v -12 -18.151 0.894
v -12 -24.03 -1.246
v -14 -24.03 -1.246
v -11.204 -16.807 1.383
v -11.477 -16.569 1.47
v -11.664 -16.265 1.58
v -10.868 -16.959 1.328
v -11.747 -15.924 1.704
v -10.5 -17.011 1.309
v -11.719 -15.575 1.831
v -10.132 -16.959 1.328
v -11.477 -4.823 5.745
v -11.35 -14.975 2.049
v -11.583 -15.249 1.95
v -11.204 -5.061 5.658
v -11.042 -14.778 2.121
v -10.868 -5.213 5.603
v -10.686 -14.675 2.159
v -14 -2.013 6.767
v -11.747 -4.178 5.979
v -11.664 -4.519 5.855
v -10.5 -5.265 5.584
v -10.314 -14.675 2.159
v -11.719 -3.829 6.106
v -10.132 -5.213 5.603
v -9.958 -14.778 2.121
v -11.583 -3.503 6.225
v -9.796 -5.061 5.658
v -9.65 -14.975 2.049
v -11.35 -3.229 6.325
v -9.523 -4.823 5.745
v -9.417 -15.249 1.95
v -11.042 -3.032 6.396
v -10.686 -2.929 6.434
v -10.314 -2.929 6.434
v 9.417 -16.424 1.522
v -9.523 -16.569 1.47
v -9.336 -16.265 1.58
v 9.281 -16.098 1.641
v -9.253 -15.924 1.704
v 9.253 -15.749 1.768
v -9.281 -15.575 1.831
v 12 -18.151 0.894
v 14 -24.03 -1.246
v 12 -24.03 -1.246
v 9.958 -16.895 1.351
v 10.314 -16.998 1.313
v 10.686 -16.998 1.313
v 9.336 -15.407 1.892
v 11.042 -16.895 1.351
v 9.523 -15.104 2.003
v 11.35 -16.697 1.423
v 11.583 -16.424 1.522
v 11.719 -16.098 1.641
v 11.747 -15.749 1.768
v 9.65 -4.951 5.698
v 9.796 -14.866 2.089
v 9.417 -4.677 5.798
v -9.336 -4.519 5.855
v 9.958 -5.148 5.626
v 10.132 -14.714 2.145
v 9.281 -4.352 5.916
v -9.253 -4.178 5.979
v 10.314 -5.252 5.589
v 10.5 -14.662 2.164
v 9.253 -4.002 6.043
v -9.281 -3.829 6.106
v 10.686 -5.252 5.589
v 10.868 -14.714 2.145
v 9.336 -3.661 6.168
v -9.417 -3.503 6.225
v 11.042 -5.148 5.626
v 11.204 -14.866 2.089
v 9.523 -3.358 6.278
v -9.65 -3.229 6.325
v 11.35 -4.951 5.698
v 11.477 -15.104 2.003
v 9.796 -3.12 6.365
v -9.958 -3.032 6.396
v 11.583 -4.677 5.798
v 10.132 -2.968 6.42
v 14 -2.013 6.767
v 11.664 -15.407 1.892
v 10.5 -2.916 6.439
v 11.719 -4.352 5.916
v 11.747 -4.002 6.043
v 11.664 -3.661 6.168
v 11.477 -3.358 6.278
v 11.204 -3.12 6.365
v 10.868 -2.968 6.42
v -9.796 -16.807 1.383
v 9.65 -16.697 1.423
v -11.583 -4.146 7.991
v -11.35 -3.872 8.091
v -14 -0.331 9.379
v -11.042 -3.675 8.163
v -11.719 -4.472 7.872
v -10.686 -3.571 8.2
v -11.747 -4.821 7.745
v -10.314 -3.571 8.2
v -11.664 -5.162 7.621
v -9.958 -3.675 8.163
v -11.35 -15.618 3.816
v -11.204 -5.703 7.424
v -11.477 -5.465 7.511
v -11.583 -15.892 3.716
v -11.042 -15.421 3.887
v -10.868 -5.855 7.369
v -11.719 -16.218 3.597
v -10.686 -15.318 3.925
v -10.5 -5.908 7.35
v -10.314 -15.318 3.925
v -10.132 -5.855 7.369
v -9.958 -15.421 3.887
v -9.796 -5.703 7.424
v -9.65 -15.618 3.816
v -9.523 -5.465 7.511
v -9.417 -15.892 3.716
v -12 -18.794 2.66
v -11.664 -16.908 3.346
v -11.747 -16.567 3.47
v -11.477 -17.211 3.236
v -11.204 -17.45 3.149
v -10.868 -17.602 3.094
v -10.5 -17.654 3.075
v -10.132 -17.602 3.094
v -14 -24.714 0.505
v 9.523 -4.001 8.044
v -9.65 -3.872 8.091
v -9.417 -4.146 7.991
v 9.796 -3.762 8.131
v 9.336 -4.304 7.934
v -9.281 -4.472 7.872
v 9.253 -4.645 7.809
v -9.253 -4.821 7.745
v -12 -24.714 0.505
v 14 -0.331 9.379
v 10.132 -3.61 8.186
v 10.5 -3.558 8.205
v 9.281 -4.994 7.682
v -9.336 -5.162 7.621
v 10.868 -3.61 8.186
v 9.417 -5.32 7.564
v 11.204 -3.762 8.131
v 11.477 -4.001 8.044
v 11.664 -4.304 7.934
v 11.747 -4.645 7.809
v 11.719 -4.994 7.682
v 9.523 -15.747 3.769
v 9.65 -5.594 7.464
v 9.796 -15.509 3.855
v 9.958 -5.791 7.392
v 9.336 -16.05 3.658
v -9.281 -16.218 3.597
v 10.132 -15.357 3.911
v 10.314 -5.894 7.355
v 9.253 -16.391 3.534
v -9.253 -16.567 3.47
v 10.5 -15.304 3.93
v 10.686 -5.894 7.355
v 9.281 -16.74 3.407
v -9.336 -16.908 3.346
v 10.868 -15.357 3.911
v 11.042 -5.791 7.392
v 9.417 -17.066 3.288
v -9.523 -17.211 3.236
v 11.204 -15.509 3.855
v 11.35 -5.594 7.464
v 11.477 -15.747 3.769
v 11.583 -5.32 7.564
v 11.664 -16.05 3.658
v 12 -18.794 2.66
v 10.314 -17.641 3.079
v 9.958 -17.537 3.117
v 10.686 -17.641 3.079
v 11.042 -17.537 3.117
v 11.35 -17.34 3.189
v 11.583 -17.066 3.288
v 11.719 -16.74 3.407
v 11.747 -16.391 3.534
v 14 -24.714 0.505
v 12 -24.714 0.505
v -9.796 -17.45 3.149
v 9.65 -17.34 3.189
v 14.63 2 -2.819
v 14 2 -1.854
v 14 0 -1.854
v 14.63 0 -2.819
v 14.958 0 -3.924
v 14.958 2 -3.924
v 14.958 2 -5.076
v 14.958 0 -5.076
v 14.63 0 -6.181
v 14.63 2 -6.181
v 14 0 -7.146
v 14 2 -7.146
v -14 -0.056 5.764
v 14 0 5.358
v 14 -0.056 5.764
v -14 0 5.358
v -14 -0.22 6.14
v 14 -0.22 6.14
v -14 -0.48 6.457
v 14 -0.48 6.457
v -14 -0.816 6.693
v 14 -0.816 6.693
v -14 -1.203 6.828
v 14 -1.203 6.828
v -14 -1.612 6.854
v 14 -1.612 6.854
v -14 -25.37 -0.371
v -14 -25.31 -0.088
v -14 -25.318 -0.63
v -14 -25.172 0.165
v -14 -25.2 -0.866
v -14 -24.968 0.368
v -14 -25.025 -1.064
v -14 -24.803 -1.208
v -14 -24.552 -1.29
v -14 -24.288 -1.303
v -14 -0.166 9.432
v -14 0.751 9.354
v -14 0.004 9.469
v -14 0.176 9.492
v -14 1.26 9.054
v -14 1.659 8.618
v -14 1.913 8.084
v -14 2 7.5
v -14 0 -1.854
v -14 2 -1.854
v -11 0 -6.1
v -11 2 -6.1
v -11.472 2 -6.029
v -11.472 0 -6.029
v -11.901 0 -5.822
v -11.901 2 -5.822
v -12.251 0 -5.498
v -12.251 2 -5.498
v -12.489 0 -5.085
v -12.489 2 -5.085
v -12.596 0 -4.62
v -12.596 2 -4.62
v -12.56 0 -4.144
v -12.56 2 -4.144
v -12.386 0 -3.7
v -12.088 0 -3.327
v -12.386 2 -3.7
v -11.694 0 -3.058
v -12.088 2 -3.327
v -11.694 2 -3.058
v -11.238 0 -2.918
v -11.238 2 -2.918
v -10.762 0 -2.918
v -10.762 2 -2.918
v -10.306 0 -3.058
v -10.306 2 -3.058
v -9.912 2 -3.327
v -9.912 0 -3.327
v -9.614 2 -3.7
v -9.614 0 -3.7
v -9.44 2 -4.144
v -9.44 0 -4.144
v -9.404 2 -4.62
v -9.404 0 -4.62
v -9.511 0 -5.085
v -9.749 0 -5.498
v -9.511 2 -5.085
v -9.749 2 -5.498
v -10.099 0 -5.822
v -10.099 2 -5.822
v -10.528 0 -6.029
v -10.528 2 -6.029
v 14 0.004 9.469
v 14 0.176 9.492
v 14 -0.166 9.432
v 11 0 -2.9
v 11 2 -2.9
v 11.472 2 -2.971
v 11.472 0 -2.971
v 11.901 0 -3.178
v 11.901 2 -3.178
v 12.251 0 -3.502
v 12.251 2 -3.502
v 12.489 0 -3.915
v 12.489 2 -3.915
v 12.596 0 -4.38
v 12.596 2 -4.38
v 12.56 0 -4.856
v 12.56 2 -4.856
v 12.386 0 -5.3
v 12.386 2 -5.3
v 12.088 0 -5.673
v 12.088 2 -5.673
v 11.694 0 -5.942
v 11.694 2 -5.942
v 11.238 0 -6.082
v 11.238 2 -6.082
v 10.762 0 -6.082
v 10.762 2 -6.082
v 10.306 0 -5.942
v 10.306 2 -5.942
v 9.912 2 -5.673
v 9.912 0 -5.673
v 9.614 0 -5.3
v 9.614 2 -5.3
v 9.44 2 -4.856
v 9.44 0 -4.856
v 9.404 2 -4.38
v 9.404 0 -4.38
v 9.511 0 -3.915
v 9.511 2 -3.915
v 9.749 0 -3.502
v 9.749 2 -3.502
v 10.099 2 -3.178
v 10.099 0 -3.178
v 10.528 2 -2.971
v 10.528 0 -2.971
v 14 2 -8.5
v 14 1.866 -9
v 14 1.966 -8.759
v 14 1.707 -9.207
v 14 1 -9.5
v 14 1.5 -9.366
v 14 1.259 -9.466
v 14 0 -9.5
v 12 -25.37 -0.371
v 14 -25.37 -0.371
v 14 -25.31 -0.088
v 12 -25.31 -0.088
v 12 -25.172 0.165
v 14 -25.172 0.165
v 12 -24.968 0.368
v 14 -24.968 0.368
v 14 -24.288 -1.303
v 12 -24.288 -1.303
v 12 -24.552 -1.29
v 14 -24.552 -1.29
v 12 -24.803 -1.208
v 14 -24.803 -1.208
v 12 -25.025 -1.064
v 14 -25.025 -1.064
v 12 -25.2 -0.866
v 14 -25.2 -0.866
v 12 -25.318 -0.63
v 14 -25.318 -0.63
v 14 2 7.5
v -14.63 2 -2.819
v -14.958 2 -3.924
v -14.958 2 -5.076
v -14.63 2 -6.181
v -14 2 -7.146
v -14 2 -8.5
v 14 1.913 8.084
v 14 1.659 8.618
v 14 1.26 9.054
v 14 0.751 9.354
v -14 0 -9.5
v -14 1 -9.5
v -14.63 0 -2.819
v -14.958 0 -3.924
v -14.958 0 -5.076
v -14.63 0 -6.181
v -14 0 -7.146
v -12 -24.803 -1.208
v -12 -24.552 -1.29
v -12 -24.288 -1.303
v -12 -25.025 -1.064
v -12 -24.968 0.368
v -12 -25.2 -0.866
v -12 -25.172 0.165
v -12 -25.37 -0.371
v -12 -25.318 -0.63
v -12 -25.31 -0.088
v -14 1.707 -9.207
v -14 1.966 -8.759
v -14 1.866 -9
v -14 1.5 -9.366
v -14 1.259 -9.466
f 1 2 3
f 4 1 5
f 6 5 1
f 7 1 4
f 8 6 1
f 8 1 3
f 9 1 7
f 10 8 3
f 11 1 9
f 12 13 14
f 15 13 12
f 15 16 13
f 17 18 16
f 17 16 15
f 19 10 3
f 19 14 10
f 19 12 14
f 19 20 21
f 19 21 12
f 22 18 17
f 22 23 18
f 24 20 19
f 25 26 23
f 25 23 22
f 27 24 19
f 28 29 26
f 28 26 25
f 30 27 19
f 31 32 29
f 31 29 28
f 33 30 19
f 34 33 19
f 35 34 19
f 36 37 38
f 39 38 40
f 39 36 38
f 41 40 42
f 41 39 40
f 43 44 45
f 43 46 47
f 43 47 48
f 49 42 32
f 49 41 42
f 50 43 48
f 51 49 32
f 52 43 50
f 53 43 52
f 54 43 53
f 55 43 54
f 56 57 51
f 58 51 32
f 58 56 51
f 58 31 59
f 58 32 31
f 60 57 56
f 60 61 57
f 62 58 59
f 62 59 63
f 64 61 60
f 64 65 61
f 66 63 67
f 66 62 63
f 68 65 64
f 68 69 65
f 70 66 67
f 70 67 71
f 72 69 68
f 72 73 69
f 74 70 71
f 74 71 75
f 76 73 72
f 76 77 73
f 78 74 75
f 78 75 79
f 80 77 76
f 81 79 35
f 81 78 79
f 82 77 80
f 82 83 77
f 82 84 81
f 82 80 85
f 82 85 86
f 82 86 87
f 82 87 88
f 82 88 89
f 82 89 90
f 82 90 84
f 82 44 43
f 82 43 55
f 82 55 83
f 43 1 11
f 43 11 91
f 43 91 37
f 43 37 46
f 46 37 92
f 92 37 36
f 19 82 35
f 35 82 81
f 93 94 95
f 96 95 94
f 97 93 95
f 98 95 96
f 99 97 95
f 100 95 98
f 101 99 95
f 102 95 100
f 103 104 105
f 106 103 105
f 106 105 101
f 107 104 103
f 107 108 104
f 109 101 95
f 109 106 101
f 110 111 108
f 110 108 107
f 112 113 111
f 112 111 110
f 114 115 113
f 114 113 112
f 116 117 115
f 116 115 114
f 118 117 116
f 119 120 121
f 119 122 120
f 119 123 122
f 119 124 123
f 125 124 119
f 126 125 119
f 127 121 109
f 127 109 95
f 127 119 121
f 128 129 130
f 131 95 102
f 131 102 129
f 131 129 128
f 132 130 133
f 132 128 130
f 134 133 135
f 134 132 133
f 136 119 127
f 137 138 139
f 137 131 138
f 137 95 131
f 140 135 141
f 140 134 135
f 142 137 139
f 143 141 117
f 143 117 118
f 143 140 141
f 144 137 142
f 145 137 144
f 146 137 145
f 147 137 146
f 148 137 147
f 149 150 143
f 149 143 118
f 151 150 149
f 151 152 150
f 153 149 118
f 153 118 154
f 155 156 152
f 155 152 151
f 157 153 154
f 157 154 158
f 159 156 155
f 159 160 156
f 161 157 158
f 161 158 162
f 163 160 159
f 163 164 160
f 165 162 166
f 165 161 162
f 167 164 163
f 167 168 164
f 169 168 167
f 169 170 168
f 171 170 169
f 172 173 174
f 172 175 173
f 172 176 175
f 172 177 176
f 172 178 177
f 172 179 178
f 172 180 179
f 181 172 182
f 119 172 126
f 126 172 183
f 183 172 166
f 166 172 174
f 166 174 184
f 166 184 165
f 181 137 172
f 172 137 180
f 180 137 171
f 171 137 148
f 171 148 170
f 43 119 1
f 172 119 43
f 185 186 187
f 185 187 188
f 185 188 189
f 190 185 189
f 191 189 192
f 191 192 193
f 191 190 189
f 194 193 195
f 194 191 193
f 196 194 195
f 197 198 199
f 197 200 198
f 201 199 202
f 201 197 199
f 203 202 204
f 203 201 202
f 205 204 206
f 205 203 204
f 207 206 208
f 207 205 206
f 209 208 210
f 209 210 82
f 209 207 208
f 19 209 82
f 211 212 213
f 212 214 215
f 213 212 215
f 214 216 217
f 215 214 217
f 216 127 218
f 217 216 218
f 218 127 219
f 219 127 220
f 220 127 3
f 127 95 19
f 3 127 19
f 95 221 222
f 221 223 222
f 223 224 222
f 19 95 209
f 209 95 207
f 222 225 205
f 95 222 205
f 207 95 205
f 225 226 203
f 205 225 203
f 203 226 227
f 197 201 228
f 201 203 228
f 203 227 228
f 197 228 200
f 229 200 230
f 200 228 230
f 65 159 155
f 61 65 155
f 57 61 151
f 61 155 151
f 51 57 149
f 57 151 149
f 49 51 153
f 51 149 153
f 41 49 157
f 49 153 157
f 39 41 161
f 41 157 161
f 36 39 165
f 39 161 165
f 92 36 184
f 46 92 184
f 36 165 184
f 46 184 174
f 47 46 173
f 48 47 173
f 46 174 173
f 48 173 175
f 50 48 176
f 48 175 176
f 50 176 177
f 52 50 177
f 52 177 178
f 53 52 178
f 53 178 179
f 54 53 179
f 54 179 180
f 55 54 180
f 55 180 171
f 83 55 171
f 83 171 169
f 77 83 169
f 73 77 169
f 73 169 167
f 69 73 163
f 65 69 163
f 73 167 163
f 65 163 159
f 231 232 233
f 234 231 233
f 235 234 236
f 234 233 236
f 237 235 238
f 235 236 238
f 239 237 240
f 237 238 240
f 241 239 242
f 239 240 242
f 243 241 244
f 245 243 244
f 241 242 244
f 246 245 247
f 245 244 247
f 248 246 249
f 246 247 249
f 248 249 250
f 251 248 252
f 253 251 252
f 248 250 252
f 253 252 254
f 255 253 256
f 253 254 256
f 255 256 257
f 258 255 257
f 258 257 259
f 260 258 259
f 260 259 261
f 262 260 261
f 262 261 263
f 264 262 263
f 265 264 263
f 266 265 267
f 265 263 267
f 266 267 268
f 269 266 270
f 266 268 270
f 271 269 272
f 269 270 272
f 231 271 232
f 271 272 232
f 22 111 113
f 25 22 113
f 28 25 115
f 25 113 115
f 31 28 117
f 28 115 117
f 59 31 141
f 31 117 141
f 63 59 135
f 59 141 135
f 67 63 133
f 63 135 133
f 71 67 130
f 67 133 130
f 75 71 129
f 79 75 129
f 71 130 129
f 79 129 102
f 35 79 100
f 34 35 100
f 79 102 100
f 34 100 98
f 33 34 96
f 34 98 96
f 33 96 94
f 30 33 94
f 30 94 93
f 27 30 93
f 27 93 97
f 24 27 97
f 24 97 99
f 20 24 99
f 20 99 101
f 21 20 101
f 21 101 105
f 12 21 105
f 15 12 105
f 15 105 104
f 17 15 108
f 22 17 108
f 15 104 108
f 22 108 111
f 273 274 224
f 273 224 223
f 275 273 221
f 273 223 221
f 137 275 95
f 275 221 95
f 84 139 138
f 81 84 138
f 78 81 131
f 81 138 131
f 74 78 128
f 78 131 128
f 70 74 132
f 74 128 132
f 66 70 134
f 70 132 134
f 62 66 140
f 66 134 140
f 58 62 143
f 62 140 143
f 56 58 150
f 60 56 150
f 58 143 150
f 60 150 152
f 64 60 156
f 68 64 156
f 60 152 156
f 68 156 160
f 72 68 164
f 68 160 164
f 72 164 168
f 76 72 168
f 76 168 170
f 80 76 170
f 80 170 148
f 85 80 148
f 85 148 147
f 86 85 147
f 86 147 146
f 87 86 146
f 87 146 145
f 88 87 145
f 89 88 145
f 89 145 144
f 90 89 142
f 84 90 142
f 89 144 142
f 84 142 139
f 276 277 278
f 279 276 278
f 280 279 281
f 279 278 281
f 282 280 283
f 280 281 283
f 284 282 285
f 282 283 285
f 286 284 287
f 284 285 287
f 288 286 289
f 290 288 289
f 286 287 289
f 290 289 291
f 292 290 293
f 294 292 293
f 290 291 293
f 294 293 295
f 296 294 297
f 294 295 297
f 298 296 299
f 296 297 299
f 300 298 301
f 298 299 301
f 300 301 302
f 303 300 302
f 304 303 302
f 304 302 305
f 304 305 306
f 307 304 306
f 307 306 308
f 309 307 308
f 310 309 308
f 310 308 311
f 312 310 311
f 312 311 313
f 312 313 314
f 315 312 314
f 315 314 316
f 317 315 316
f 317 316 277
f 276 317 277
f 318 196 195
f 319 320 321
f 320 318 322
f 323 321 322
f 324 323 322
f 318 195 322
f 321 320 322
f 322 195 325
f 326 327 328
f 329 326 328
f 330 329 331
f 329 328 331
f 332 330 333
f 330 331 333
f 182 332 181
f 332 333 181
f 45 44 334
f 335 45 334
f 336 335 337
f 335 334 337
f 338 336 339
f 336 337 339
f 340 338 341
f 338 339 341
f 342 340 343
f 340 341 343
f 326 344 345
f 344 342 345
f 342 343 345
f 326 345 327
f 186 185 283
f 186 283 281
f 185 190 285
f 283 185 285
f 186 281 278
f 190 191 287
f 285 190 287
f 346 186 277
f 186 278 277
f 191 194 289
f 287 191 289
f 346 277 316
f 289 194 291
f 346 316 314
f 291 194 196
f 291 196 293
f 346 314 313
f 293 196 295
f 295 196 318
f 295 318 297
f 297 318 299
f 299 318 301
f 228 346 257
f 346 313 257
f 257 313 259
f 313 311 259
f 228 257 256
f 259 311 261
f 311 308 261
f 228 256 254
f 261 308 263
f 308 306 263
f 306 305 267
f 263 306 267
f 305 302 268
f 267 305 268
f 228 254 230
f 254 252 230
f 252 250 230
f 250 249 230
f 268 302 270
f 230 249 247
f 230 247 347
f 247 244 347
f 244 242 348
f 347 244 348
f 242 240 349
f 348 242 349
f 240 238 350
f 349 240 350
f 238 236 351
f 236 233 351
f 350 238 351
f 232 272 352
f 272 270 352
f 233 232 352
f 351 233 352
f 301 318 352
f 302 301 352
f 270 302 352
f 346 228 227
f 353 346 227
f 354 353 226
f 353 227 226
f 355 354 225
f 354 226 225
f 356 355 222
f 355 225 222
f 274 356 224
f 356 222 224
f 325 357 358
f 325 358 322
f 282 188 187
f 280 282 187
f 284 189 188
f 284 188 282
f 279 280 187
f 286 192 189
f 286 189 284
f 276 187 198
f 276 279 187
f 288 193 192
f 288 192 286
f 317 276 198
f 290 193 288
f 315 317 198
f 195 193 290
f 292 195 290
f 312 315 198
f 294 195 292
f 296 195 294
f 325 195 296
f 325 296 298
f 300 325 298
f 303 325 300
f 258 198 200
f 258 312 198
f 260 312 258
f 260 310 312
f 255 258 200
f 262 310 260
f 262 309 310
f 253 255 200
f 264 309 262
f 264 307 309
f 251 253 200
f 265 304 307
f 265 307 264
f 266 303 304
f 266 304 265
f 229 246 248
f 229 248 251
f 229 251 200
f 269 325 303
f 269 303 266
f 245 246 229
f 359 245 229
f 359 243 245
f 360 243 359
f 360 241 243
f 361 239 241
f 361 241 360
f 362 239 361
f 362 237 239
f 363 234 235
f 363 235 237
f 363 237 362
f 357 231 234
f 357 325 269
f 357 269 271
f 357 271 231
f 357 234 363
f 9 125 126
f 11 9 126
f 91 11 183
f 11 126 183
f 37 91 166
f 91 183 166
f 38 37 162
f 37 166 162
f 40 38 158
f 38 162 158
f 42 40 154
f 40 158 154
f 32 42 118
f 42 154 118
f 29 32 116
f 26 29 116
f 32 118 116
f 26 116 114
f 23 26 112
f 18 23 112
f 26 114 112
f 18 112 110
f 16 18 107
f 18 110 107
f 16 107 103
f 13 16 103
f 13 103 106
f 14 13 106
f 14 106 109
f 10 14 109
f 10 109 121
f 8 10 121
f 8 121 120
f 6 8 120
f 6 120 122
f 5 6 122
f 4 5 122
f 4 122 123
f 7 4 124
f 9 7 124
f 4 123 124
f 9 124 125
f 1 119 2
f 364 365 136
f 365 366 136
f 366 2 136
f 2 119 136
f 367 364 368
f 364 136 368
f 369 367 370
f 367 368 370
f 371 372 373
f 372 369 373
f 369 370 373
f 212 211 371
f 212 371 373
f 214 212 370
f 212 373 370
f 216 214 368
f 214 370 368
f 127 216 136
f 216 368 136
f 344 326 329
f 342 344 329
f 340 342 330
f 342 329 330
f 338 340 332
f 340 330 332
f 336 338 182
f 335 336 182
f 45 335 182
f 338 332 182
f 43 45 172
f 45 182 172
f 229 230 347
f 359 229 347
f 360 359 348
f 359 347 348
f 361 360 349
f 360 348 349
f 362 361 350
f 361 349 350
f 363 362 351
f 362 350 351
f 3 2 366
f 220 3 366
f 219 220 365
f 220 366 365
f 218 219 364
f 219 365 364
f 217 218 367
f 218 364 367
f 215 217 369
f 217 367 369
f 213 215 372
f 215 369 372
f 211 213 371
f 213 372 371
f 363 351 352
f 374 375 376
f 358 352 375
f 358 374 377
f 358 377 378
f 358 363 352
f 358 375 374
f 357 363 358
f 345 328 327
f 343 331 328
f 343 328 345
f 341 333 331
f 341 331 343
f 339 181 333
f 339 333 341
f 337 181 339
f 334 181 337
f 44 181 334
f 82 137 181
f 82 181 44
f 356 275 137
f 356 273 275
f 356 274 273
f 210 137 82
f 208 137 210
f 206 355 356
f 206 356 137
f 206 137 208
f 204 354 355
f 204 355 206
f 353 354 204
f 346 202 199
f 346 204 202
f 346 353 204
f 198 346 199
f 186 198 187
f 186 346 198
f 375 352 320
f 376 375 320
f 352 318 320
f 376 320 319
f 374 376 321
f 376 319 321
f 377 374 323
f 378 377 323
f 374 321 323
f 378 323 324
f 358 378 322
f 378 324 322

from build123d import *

# Parameters (mm, degrees)
SZKIC1_W                    = 28
SZKIC1_H                    = 19
DODANIE_WYCI_GNI_CIE1_DEPTH = 2
SZKIC2_R                    = 1.6
WYTNIJ_WYCI_GNI_CIE1_DEPTH  = 18.036725037
SZKIC7_R                    = 4
SZKIC7_R_2                  = 1.6
DODANIE_WYCI_GNI_CIE3_DEPTH = 2
DODANIE_WYCI_GNI_CIE2_DEPTH = 28
SZKIC4_R                    = 1.25
WYTNIJ_WYCI_GNI_CIE2_DEPTH  = 1.879385242
WYTNIJ_WYCI_GNI_CIE4_DEPTH  = 33.297362502
ZAOKR_GLENIE1_R             = 2
ZAOKR_GLENIE2_R             = 1.5
ZAOKR_GLENIE3_R             = 1
ZAOKR_GLENIE4_R             = 1


with BuildPart() as part:
    # Szkic1 → Dodanie-wyciągnięcie1 (new body)
    with BuildSketch(Plane(origin=(0, 0, 0), x_dir=(1, 0, 0), z_dir=(0, 1, 0))):
        Rectangle(SZKIC1_W, SZKIC1_H)
    extrude(amount=DODANIE_WYCI_GNI_CIE1_DEPTH)

    # Szkic2 → Wytnij-wyciągnięcie1 (cut, through all)
    with BuildSketch(Plane(origin=(0, 2, 0), x_dir=(1, 0, 0), z_dir=(0, 1, 0))):
        with Locations(Location((11, 4.5, 0), (0, 0, 270))):
            Circle(SZKIC2_R)
        with Locations(Location((-11, 4.5, 0), (0, 0, 90))):
            Circle(SZKIC2_R)
    extrude(amount=-WYTNIJ_WYCI_GNI_CIE1_DEPTH, mode=Mode.SUBTRACT)

    # Szkic7 → Dodanie-wyciągnięcie3 (add)
    with BuildSketch(Plane(origin=(0, 2, 0), x_dir=(1, 0, 0), z_dir=(0, 1, 0))):
        with Locations((11, 4.5)):
            Circle(SZKIC7_R)
        with Locations(Location((11, 4.5, 0), (0, 0, 270))):
            Circle(SZKIC7_R_2, mode=Mode.SUBTRACT)
    dodanie_wyci_gni_cie3 = extrude(amount=-DODANIE_WYCI_GNI_CIE3_DEPTH)

    # Lustro1: Dodanie-wyciągnięcie3 across plane
    add(dodanie_wyci_gni_cie3.mirror(Plane(origin=(0, 0, 0), x_dir=(0, 0, 1), z_dir=(1, 0, 0))))

    # Szkic3 → Dodanie-wyciągnięcie2 (add)
    with BuildSketch(Plane(origin=(14, 0, 0), x_dir=(0, 0, -1), z_dir=(1, 0, 0))):
        Polygon((-9.5, 0), (-0.26545613, -25.371700761), (1.73454387, -25.371700761), (-7.5, 0), align=None)
    extrude(amount=-DODANIE_WYCI_GNI_CIE2_DEPTH)

    # Szkic4 → Wytnij-wyciągnięcie2 (cut)
    with BuildSketch(Plane(origin=(0, -3.053241146, 8.388711105), x_dir=(1, 0, 0), z_dir=(0, -0.3420201433256705, 0.9396926207859079))):
        with Locations(Location((-10.5, -1.787484051, 0), (0, 0, 270))):
            Circle(SZKIC4_R)
        with Locations(Location((-10.5, -14.287484051, 0), (0, 0, 270))):
            Circle(SZKIC4_R)
        with Locations(Location((10.5, -14.287484051, 0), (0, 0, 90))):
            Circle(SZKIC4_R)
        with Locations(Location((10.5, -1.787484051, 0), (0, 0, 90))):
            Circle(SZKIC4_R)
    extrude(amount=-WYTNIJ_WYCI_GNI_CIE2_DEPTH, mode=Mode.SUBTRACT)

    # Szkic6 → Wytnij-wyciągnięcie4 (cut, through all)
    with BuildSketch(Plane(origin=(0, -3.053241146, 8.388711105), x_dir=(1, 0, 0), z_dir=(0, -0.3420201433256704, 0.9396926207859078))):
        Polygon((-12, -23.750808638), (-12, -16.750808638), (12, -16.750808638), (12, -23.750808638), (12, -25.909421261), (-12, -25.909421261), align=None)
    extrude(amount=-WYTNIJ_WYCI_GNI_CIE4_DEPTH, mode=Mode.SUBTRACT)

    # Zaokrąglenie1
    # the kernel refuses this fillet: 2 mm, written as the material it takes off along each edge
    with BuildSketch(Plane(origin=(-19, 2, 9.5), x_dir=(0, -1, 0), z_dir=(1, 0, 0))) as zaokr_glenie1_piece_1:
        with BuildLine():
            CenterArc((ZAOKR_GLENIE1_R, ZAOKR_GLENIE1_R), ZAOKR_GLENIE1_R, 180, 90)
            Line((0, ZAOKR_GLENIE1_R), (0, 0))
            Line((0, 0), (ZAOKR_GLENIE1_R, 0))
        make_face()
    extrude(amount=38, mode=Mode.SUBTRACT)
    with BuildSketch(Plane(origin=(-14.881634904, 0, 9.5), x_dir=(0, 1, 0), z_dir=(1, 0, 0))) as zaokr_glenie1_piece_2:
        with BuildLine():
            CenterArc((ZAOKR_GLENIE1_R * 0.176326980708, -ZAOKR_GLENIE1_R), ZAOKR_GLENIE1_R, 90, 20)
            Line((-ZAOKR_GLENIE1_R * 0.165693162617, -ZAOKR_GLENIE1_R * 0.0603073792141), (0, 0))
            Line((0, 0), (ZAOKR_GLENIE1_R * 0.176326980708, 0))
        make_face()
    extrude(amount=29.763269807, mode=Mode.SUBTRACT)

    # Zaokrąglenie2
    zaokr_glenie2_edges = [part.edges().sort_by_distance(p)[0] for p in [
        (0, 0, 7.5),
    ]]
    fillet(zaokr_glenie2_edges, radius=ZAOKR_GLENIE2_R)

    # Zaokrąglenie3
    # the kernel refuses this fillet: 1 mm, written as the material it takes off along each edge
    with BuildSketch(Plane(origin=(17.570370017, -25.371700761, -1.73454387), x_dir=(0, 0.9396926207859079, 0.34202014332567016), z_dir=(-1, 0, 0)), Plane(origin=(-8.429629983, -25.371700761, -1.73454387), x_dir=(0, 0.9396926207859079, 0.34202014332567016), z_dir=(-1, 0, 0))) as zaokr_glenie3_piece_1:
        with BuildLine():
            CenterArc((ZAOKR_GLENIE3_R * 1.42814800674, -ZAOKR_GLENIE3_R), ZAOKR_GLENIE3_R, 90, 110)
            Line((ZAOKR_GLENIE3_R * 0.488455385956, -ZAOKR_GLENIE3_R * 1.34202014333), (0, 0))
            Line((0, 0), (ZAOKR_GLENIE3_R * 1.42814800674, 0))
        make_face()
    extrude(amount=9.140740034, mode=Mode.SUBTRACT)
    with BuildSketch(Plane(origin=(-10.249481154, -25.371700761, 0.26545613), x_dir=(0, 0.9396926207859077, 0.34202014332567093), z_dir=(-1, 0, 0))) as zaokr_glenie3_piece_2:
        with BuildLine():
            CenterArc((ZAOKR_GLENIE3_R * 0.70020753821, ZAOKR_GLENIE3_R), ZAOKR_GLENIE3_R, 200, 70)
            Line((-ZAOKR_GLENIE3_R * 0.239485082576, ZAOKR_GLENIE3_R * 0.657979856674), (0, 0))
            Line((0, 0), (ZAOKR_GLENIE3_R * 0.70020753821, 0))
        make_face()
    extrude(amount=5.501037691, mode=Mode.SUBTRACT)
    with BuildSketch(Plane(origin=(15.750518846, -25.371700761, 0.26545613), x_dir=(0, 0, -1), z_dir=(-1, 0, 0))) as zaokr_glenie3_piece_3:
        with BuildLine():
            CenterArc((ZAOKR_GLENIE3_R * 0.70020753821, -ZAOKR_GLENIE3_R), ZAOKR_GLENIE3_R, 90, 70)
            Line((-ZAOKR_GLENIE3_R * 0.239485082576, -ZAOKR_GLENIE3_R * 0.657979856674), (0, 0))
            Line((0, 0), (ZAOKR_GLENIE3_R * 0.70020753821, 0))
        make_face()
    extrude(amount=5.501037691, mode=Mode.SUBTRACT)

    # Zaokrąglenie4
    zaokr_glenie4_edges = [part.edges().sort_by_distance(p)[0] for p in [
        (0, 2, -9.5),
    ]]
    fillet(zaokr_glenie4_edges, radius=ZAOKR_GLENIE4_R)


solid = part.part
